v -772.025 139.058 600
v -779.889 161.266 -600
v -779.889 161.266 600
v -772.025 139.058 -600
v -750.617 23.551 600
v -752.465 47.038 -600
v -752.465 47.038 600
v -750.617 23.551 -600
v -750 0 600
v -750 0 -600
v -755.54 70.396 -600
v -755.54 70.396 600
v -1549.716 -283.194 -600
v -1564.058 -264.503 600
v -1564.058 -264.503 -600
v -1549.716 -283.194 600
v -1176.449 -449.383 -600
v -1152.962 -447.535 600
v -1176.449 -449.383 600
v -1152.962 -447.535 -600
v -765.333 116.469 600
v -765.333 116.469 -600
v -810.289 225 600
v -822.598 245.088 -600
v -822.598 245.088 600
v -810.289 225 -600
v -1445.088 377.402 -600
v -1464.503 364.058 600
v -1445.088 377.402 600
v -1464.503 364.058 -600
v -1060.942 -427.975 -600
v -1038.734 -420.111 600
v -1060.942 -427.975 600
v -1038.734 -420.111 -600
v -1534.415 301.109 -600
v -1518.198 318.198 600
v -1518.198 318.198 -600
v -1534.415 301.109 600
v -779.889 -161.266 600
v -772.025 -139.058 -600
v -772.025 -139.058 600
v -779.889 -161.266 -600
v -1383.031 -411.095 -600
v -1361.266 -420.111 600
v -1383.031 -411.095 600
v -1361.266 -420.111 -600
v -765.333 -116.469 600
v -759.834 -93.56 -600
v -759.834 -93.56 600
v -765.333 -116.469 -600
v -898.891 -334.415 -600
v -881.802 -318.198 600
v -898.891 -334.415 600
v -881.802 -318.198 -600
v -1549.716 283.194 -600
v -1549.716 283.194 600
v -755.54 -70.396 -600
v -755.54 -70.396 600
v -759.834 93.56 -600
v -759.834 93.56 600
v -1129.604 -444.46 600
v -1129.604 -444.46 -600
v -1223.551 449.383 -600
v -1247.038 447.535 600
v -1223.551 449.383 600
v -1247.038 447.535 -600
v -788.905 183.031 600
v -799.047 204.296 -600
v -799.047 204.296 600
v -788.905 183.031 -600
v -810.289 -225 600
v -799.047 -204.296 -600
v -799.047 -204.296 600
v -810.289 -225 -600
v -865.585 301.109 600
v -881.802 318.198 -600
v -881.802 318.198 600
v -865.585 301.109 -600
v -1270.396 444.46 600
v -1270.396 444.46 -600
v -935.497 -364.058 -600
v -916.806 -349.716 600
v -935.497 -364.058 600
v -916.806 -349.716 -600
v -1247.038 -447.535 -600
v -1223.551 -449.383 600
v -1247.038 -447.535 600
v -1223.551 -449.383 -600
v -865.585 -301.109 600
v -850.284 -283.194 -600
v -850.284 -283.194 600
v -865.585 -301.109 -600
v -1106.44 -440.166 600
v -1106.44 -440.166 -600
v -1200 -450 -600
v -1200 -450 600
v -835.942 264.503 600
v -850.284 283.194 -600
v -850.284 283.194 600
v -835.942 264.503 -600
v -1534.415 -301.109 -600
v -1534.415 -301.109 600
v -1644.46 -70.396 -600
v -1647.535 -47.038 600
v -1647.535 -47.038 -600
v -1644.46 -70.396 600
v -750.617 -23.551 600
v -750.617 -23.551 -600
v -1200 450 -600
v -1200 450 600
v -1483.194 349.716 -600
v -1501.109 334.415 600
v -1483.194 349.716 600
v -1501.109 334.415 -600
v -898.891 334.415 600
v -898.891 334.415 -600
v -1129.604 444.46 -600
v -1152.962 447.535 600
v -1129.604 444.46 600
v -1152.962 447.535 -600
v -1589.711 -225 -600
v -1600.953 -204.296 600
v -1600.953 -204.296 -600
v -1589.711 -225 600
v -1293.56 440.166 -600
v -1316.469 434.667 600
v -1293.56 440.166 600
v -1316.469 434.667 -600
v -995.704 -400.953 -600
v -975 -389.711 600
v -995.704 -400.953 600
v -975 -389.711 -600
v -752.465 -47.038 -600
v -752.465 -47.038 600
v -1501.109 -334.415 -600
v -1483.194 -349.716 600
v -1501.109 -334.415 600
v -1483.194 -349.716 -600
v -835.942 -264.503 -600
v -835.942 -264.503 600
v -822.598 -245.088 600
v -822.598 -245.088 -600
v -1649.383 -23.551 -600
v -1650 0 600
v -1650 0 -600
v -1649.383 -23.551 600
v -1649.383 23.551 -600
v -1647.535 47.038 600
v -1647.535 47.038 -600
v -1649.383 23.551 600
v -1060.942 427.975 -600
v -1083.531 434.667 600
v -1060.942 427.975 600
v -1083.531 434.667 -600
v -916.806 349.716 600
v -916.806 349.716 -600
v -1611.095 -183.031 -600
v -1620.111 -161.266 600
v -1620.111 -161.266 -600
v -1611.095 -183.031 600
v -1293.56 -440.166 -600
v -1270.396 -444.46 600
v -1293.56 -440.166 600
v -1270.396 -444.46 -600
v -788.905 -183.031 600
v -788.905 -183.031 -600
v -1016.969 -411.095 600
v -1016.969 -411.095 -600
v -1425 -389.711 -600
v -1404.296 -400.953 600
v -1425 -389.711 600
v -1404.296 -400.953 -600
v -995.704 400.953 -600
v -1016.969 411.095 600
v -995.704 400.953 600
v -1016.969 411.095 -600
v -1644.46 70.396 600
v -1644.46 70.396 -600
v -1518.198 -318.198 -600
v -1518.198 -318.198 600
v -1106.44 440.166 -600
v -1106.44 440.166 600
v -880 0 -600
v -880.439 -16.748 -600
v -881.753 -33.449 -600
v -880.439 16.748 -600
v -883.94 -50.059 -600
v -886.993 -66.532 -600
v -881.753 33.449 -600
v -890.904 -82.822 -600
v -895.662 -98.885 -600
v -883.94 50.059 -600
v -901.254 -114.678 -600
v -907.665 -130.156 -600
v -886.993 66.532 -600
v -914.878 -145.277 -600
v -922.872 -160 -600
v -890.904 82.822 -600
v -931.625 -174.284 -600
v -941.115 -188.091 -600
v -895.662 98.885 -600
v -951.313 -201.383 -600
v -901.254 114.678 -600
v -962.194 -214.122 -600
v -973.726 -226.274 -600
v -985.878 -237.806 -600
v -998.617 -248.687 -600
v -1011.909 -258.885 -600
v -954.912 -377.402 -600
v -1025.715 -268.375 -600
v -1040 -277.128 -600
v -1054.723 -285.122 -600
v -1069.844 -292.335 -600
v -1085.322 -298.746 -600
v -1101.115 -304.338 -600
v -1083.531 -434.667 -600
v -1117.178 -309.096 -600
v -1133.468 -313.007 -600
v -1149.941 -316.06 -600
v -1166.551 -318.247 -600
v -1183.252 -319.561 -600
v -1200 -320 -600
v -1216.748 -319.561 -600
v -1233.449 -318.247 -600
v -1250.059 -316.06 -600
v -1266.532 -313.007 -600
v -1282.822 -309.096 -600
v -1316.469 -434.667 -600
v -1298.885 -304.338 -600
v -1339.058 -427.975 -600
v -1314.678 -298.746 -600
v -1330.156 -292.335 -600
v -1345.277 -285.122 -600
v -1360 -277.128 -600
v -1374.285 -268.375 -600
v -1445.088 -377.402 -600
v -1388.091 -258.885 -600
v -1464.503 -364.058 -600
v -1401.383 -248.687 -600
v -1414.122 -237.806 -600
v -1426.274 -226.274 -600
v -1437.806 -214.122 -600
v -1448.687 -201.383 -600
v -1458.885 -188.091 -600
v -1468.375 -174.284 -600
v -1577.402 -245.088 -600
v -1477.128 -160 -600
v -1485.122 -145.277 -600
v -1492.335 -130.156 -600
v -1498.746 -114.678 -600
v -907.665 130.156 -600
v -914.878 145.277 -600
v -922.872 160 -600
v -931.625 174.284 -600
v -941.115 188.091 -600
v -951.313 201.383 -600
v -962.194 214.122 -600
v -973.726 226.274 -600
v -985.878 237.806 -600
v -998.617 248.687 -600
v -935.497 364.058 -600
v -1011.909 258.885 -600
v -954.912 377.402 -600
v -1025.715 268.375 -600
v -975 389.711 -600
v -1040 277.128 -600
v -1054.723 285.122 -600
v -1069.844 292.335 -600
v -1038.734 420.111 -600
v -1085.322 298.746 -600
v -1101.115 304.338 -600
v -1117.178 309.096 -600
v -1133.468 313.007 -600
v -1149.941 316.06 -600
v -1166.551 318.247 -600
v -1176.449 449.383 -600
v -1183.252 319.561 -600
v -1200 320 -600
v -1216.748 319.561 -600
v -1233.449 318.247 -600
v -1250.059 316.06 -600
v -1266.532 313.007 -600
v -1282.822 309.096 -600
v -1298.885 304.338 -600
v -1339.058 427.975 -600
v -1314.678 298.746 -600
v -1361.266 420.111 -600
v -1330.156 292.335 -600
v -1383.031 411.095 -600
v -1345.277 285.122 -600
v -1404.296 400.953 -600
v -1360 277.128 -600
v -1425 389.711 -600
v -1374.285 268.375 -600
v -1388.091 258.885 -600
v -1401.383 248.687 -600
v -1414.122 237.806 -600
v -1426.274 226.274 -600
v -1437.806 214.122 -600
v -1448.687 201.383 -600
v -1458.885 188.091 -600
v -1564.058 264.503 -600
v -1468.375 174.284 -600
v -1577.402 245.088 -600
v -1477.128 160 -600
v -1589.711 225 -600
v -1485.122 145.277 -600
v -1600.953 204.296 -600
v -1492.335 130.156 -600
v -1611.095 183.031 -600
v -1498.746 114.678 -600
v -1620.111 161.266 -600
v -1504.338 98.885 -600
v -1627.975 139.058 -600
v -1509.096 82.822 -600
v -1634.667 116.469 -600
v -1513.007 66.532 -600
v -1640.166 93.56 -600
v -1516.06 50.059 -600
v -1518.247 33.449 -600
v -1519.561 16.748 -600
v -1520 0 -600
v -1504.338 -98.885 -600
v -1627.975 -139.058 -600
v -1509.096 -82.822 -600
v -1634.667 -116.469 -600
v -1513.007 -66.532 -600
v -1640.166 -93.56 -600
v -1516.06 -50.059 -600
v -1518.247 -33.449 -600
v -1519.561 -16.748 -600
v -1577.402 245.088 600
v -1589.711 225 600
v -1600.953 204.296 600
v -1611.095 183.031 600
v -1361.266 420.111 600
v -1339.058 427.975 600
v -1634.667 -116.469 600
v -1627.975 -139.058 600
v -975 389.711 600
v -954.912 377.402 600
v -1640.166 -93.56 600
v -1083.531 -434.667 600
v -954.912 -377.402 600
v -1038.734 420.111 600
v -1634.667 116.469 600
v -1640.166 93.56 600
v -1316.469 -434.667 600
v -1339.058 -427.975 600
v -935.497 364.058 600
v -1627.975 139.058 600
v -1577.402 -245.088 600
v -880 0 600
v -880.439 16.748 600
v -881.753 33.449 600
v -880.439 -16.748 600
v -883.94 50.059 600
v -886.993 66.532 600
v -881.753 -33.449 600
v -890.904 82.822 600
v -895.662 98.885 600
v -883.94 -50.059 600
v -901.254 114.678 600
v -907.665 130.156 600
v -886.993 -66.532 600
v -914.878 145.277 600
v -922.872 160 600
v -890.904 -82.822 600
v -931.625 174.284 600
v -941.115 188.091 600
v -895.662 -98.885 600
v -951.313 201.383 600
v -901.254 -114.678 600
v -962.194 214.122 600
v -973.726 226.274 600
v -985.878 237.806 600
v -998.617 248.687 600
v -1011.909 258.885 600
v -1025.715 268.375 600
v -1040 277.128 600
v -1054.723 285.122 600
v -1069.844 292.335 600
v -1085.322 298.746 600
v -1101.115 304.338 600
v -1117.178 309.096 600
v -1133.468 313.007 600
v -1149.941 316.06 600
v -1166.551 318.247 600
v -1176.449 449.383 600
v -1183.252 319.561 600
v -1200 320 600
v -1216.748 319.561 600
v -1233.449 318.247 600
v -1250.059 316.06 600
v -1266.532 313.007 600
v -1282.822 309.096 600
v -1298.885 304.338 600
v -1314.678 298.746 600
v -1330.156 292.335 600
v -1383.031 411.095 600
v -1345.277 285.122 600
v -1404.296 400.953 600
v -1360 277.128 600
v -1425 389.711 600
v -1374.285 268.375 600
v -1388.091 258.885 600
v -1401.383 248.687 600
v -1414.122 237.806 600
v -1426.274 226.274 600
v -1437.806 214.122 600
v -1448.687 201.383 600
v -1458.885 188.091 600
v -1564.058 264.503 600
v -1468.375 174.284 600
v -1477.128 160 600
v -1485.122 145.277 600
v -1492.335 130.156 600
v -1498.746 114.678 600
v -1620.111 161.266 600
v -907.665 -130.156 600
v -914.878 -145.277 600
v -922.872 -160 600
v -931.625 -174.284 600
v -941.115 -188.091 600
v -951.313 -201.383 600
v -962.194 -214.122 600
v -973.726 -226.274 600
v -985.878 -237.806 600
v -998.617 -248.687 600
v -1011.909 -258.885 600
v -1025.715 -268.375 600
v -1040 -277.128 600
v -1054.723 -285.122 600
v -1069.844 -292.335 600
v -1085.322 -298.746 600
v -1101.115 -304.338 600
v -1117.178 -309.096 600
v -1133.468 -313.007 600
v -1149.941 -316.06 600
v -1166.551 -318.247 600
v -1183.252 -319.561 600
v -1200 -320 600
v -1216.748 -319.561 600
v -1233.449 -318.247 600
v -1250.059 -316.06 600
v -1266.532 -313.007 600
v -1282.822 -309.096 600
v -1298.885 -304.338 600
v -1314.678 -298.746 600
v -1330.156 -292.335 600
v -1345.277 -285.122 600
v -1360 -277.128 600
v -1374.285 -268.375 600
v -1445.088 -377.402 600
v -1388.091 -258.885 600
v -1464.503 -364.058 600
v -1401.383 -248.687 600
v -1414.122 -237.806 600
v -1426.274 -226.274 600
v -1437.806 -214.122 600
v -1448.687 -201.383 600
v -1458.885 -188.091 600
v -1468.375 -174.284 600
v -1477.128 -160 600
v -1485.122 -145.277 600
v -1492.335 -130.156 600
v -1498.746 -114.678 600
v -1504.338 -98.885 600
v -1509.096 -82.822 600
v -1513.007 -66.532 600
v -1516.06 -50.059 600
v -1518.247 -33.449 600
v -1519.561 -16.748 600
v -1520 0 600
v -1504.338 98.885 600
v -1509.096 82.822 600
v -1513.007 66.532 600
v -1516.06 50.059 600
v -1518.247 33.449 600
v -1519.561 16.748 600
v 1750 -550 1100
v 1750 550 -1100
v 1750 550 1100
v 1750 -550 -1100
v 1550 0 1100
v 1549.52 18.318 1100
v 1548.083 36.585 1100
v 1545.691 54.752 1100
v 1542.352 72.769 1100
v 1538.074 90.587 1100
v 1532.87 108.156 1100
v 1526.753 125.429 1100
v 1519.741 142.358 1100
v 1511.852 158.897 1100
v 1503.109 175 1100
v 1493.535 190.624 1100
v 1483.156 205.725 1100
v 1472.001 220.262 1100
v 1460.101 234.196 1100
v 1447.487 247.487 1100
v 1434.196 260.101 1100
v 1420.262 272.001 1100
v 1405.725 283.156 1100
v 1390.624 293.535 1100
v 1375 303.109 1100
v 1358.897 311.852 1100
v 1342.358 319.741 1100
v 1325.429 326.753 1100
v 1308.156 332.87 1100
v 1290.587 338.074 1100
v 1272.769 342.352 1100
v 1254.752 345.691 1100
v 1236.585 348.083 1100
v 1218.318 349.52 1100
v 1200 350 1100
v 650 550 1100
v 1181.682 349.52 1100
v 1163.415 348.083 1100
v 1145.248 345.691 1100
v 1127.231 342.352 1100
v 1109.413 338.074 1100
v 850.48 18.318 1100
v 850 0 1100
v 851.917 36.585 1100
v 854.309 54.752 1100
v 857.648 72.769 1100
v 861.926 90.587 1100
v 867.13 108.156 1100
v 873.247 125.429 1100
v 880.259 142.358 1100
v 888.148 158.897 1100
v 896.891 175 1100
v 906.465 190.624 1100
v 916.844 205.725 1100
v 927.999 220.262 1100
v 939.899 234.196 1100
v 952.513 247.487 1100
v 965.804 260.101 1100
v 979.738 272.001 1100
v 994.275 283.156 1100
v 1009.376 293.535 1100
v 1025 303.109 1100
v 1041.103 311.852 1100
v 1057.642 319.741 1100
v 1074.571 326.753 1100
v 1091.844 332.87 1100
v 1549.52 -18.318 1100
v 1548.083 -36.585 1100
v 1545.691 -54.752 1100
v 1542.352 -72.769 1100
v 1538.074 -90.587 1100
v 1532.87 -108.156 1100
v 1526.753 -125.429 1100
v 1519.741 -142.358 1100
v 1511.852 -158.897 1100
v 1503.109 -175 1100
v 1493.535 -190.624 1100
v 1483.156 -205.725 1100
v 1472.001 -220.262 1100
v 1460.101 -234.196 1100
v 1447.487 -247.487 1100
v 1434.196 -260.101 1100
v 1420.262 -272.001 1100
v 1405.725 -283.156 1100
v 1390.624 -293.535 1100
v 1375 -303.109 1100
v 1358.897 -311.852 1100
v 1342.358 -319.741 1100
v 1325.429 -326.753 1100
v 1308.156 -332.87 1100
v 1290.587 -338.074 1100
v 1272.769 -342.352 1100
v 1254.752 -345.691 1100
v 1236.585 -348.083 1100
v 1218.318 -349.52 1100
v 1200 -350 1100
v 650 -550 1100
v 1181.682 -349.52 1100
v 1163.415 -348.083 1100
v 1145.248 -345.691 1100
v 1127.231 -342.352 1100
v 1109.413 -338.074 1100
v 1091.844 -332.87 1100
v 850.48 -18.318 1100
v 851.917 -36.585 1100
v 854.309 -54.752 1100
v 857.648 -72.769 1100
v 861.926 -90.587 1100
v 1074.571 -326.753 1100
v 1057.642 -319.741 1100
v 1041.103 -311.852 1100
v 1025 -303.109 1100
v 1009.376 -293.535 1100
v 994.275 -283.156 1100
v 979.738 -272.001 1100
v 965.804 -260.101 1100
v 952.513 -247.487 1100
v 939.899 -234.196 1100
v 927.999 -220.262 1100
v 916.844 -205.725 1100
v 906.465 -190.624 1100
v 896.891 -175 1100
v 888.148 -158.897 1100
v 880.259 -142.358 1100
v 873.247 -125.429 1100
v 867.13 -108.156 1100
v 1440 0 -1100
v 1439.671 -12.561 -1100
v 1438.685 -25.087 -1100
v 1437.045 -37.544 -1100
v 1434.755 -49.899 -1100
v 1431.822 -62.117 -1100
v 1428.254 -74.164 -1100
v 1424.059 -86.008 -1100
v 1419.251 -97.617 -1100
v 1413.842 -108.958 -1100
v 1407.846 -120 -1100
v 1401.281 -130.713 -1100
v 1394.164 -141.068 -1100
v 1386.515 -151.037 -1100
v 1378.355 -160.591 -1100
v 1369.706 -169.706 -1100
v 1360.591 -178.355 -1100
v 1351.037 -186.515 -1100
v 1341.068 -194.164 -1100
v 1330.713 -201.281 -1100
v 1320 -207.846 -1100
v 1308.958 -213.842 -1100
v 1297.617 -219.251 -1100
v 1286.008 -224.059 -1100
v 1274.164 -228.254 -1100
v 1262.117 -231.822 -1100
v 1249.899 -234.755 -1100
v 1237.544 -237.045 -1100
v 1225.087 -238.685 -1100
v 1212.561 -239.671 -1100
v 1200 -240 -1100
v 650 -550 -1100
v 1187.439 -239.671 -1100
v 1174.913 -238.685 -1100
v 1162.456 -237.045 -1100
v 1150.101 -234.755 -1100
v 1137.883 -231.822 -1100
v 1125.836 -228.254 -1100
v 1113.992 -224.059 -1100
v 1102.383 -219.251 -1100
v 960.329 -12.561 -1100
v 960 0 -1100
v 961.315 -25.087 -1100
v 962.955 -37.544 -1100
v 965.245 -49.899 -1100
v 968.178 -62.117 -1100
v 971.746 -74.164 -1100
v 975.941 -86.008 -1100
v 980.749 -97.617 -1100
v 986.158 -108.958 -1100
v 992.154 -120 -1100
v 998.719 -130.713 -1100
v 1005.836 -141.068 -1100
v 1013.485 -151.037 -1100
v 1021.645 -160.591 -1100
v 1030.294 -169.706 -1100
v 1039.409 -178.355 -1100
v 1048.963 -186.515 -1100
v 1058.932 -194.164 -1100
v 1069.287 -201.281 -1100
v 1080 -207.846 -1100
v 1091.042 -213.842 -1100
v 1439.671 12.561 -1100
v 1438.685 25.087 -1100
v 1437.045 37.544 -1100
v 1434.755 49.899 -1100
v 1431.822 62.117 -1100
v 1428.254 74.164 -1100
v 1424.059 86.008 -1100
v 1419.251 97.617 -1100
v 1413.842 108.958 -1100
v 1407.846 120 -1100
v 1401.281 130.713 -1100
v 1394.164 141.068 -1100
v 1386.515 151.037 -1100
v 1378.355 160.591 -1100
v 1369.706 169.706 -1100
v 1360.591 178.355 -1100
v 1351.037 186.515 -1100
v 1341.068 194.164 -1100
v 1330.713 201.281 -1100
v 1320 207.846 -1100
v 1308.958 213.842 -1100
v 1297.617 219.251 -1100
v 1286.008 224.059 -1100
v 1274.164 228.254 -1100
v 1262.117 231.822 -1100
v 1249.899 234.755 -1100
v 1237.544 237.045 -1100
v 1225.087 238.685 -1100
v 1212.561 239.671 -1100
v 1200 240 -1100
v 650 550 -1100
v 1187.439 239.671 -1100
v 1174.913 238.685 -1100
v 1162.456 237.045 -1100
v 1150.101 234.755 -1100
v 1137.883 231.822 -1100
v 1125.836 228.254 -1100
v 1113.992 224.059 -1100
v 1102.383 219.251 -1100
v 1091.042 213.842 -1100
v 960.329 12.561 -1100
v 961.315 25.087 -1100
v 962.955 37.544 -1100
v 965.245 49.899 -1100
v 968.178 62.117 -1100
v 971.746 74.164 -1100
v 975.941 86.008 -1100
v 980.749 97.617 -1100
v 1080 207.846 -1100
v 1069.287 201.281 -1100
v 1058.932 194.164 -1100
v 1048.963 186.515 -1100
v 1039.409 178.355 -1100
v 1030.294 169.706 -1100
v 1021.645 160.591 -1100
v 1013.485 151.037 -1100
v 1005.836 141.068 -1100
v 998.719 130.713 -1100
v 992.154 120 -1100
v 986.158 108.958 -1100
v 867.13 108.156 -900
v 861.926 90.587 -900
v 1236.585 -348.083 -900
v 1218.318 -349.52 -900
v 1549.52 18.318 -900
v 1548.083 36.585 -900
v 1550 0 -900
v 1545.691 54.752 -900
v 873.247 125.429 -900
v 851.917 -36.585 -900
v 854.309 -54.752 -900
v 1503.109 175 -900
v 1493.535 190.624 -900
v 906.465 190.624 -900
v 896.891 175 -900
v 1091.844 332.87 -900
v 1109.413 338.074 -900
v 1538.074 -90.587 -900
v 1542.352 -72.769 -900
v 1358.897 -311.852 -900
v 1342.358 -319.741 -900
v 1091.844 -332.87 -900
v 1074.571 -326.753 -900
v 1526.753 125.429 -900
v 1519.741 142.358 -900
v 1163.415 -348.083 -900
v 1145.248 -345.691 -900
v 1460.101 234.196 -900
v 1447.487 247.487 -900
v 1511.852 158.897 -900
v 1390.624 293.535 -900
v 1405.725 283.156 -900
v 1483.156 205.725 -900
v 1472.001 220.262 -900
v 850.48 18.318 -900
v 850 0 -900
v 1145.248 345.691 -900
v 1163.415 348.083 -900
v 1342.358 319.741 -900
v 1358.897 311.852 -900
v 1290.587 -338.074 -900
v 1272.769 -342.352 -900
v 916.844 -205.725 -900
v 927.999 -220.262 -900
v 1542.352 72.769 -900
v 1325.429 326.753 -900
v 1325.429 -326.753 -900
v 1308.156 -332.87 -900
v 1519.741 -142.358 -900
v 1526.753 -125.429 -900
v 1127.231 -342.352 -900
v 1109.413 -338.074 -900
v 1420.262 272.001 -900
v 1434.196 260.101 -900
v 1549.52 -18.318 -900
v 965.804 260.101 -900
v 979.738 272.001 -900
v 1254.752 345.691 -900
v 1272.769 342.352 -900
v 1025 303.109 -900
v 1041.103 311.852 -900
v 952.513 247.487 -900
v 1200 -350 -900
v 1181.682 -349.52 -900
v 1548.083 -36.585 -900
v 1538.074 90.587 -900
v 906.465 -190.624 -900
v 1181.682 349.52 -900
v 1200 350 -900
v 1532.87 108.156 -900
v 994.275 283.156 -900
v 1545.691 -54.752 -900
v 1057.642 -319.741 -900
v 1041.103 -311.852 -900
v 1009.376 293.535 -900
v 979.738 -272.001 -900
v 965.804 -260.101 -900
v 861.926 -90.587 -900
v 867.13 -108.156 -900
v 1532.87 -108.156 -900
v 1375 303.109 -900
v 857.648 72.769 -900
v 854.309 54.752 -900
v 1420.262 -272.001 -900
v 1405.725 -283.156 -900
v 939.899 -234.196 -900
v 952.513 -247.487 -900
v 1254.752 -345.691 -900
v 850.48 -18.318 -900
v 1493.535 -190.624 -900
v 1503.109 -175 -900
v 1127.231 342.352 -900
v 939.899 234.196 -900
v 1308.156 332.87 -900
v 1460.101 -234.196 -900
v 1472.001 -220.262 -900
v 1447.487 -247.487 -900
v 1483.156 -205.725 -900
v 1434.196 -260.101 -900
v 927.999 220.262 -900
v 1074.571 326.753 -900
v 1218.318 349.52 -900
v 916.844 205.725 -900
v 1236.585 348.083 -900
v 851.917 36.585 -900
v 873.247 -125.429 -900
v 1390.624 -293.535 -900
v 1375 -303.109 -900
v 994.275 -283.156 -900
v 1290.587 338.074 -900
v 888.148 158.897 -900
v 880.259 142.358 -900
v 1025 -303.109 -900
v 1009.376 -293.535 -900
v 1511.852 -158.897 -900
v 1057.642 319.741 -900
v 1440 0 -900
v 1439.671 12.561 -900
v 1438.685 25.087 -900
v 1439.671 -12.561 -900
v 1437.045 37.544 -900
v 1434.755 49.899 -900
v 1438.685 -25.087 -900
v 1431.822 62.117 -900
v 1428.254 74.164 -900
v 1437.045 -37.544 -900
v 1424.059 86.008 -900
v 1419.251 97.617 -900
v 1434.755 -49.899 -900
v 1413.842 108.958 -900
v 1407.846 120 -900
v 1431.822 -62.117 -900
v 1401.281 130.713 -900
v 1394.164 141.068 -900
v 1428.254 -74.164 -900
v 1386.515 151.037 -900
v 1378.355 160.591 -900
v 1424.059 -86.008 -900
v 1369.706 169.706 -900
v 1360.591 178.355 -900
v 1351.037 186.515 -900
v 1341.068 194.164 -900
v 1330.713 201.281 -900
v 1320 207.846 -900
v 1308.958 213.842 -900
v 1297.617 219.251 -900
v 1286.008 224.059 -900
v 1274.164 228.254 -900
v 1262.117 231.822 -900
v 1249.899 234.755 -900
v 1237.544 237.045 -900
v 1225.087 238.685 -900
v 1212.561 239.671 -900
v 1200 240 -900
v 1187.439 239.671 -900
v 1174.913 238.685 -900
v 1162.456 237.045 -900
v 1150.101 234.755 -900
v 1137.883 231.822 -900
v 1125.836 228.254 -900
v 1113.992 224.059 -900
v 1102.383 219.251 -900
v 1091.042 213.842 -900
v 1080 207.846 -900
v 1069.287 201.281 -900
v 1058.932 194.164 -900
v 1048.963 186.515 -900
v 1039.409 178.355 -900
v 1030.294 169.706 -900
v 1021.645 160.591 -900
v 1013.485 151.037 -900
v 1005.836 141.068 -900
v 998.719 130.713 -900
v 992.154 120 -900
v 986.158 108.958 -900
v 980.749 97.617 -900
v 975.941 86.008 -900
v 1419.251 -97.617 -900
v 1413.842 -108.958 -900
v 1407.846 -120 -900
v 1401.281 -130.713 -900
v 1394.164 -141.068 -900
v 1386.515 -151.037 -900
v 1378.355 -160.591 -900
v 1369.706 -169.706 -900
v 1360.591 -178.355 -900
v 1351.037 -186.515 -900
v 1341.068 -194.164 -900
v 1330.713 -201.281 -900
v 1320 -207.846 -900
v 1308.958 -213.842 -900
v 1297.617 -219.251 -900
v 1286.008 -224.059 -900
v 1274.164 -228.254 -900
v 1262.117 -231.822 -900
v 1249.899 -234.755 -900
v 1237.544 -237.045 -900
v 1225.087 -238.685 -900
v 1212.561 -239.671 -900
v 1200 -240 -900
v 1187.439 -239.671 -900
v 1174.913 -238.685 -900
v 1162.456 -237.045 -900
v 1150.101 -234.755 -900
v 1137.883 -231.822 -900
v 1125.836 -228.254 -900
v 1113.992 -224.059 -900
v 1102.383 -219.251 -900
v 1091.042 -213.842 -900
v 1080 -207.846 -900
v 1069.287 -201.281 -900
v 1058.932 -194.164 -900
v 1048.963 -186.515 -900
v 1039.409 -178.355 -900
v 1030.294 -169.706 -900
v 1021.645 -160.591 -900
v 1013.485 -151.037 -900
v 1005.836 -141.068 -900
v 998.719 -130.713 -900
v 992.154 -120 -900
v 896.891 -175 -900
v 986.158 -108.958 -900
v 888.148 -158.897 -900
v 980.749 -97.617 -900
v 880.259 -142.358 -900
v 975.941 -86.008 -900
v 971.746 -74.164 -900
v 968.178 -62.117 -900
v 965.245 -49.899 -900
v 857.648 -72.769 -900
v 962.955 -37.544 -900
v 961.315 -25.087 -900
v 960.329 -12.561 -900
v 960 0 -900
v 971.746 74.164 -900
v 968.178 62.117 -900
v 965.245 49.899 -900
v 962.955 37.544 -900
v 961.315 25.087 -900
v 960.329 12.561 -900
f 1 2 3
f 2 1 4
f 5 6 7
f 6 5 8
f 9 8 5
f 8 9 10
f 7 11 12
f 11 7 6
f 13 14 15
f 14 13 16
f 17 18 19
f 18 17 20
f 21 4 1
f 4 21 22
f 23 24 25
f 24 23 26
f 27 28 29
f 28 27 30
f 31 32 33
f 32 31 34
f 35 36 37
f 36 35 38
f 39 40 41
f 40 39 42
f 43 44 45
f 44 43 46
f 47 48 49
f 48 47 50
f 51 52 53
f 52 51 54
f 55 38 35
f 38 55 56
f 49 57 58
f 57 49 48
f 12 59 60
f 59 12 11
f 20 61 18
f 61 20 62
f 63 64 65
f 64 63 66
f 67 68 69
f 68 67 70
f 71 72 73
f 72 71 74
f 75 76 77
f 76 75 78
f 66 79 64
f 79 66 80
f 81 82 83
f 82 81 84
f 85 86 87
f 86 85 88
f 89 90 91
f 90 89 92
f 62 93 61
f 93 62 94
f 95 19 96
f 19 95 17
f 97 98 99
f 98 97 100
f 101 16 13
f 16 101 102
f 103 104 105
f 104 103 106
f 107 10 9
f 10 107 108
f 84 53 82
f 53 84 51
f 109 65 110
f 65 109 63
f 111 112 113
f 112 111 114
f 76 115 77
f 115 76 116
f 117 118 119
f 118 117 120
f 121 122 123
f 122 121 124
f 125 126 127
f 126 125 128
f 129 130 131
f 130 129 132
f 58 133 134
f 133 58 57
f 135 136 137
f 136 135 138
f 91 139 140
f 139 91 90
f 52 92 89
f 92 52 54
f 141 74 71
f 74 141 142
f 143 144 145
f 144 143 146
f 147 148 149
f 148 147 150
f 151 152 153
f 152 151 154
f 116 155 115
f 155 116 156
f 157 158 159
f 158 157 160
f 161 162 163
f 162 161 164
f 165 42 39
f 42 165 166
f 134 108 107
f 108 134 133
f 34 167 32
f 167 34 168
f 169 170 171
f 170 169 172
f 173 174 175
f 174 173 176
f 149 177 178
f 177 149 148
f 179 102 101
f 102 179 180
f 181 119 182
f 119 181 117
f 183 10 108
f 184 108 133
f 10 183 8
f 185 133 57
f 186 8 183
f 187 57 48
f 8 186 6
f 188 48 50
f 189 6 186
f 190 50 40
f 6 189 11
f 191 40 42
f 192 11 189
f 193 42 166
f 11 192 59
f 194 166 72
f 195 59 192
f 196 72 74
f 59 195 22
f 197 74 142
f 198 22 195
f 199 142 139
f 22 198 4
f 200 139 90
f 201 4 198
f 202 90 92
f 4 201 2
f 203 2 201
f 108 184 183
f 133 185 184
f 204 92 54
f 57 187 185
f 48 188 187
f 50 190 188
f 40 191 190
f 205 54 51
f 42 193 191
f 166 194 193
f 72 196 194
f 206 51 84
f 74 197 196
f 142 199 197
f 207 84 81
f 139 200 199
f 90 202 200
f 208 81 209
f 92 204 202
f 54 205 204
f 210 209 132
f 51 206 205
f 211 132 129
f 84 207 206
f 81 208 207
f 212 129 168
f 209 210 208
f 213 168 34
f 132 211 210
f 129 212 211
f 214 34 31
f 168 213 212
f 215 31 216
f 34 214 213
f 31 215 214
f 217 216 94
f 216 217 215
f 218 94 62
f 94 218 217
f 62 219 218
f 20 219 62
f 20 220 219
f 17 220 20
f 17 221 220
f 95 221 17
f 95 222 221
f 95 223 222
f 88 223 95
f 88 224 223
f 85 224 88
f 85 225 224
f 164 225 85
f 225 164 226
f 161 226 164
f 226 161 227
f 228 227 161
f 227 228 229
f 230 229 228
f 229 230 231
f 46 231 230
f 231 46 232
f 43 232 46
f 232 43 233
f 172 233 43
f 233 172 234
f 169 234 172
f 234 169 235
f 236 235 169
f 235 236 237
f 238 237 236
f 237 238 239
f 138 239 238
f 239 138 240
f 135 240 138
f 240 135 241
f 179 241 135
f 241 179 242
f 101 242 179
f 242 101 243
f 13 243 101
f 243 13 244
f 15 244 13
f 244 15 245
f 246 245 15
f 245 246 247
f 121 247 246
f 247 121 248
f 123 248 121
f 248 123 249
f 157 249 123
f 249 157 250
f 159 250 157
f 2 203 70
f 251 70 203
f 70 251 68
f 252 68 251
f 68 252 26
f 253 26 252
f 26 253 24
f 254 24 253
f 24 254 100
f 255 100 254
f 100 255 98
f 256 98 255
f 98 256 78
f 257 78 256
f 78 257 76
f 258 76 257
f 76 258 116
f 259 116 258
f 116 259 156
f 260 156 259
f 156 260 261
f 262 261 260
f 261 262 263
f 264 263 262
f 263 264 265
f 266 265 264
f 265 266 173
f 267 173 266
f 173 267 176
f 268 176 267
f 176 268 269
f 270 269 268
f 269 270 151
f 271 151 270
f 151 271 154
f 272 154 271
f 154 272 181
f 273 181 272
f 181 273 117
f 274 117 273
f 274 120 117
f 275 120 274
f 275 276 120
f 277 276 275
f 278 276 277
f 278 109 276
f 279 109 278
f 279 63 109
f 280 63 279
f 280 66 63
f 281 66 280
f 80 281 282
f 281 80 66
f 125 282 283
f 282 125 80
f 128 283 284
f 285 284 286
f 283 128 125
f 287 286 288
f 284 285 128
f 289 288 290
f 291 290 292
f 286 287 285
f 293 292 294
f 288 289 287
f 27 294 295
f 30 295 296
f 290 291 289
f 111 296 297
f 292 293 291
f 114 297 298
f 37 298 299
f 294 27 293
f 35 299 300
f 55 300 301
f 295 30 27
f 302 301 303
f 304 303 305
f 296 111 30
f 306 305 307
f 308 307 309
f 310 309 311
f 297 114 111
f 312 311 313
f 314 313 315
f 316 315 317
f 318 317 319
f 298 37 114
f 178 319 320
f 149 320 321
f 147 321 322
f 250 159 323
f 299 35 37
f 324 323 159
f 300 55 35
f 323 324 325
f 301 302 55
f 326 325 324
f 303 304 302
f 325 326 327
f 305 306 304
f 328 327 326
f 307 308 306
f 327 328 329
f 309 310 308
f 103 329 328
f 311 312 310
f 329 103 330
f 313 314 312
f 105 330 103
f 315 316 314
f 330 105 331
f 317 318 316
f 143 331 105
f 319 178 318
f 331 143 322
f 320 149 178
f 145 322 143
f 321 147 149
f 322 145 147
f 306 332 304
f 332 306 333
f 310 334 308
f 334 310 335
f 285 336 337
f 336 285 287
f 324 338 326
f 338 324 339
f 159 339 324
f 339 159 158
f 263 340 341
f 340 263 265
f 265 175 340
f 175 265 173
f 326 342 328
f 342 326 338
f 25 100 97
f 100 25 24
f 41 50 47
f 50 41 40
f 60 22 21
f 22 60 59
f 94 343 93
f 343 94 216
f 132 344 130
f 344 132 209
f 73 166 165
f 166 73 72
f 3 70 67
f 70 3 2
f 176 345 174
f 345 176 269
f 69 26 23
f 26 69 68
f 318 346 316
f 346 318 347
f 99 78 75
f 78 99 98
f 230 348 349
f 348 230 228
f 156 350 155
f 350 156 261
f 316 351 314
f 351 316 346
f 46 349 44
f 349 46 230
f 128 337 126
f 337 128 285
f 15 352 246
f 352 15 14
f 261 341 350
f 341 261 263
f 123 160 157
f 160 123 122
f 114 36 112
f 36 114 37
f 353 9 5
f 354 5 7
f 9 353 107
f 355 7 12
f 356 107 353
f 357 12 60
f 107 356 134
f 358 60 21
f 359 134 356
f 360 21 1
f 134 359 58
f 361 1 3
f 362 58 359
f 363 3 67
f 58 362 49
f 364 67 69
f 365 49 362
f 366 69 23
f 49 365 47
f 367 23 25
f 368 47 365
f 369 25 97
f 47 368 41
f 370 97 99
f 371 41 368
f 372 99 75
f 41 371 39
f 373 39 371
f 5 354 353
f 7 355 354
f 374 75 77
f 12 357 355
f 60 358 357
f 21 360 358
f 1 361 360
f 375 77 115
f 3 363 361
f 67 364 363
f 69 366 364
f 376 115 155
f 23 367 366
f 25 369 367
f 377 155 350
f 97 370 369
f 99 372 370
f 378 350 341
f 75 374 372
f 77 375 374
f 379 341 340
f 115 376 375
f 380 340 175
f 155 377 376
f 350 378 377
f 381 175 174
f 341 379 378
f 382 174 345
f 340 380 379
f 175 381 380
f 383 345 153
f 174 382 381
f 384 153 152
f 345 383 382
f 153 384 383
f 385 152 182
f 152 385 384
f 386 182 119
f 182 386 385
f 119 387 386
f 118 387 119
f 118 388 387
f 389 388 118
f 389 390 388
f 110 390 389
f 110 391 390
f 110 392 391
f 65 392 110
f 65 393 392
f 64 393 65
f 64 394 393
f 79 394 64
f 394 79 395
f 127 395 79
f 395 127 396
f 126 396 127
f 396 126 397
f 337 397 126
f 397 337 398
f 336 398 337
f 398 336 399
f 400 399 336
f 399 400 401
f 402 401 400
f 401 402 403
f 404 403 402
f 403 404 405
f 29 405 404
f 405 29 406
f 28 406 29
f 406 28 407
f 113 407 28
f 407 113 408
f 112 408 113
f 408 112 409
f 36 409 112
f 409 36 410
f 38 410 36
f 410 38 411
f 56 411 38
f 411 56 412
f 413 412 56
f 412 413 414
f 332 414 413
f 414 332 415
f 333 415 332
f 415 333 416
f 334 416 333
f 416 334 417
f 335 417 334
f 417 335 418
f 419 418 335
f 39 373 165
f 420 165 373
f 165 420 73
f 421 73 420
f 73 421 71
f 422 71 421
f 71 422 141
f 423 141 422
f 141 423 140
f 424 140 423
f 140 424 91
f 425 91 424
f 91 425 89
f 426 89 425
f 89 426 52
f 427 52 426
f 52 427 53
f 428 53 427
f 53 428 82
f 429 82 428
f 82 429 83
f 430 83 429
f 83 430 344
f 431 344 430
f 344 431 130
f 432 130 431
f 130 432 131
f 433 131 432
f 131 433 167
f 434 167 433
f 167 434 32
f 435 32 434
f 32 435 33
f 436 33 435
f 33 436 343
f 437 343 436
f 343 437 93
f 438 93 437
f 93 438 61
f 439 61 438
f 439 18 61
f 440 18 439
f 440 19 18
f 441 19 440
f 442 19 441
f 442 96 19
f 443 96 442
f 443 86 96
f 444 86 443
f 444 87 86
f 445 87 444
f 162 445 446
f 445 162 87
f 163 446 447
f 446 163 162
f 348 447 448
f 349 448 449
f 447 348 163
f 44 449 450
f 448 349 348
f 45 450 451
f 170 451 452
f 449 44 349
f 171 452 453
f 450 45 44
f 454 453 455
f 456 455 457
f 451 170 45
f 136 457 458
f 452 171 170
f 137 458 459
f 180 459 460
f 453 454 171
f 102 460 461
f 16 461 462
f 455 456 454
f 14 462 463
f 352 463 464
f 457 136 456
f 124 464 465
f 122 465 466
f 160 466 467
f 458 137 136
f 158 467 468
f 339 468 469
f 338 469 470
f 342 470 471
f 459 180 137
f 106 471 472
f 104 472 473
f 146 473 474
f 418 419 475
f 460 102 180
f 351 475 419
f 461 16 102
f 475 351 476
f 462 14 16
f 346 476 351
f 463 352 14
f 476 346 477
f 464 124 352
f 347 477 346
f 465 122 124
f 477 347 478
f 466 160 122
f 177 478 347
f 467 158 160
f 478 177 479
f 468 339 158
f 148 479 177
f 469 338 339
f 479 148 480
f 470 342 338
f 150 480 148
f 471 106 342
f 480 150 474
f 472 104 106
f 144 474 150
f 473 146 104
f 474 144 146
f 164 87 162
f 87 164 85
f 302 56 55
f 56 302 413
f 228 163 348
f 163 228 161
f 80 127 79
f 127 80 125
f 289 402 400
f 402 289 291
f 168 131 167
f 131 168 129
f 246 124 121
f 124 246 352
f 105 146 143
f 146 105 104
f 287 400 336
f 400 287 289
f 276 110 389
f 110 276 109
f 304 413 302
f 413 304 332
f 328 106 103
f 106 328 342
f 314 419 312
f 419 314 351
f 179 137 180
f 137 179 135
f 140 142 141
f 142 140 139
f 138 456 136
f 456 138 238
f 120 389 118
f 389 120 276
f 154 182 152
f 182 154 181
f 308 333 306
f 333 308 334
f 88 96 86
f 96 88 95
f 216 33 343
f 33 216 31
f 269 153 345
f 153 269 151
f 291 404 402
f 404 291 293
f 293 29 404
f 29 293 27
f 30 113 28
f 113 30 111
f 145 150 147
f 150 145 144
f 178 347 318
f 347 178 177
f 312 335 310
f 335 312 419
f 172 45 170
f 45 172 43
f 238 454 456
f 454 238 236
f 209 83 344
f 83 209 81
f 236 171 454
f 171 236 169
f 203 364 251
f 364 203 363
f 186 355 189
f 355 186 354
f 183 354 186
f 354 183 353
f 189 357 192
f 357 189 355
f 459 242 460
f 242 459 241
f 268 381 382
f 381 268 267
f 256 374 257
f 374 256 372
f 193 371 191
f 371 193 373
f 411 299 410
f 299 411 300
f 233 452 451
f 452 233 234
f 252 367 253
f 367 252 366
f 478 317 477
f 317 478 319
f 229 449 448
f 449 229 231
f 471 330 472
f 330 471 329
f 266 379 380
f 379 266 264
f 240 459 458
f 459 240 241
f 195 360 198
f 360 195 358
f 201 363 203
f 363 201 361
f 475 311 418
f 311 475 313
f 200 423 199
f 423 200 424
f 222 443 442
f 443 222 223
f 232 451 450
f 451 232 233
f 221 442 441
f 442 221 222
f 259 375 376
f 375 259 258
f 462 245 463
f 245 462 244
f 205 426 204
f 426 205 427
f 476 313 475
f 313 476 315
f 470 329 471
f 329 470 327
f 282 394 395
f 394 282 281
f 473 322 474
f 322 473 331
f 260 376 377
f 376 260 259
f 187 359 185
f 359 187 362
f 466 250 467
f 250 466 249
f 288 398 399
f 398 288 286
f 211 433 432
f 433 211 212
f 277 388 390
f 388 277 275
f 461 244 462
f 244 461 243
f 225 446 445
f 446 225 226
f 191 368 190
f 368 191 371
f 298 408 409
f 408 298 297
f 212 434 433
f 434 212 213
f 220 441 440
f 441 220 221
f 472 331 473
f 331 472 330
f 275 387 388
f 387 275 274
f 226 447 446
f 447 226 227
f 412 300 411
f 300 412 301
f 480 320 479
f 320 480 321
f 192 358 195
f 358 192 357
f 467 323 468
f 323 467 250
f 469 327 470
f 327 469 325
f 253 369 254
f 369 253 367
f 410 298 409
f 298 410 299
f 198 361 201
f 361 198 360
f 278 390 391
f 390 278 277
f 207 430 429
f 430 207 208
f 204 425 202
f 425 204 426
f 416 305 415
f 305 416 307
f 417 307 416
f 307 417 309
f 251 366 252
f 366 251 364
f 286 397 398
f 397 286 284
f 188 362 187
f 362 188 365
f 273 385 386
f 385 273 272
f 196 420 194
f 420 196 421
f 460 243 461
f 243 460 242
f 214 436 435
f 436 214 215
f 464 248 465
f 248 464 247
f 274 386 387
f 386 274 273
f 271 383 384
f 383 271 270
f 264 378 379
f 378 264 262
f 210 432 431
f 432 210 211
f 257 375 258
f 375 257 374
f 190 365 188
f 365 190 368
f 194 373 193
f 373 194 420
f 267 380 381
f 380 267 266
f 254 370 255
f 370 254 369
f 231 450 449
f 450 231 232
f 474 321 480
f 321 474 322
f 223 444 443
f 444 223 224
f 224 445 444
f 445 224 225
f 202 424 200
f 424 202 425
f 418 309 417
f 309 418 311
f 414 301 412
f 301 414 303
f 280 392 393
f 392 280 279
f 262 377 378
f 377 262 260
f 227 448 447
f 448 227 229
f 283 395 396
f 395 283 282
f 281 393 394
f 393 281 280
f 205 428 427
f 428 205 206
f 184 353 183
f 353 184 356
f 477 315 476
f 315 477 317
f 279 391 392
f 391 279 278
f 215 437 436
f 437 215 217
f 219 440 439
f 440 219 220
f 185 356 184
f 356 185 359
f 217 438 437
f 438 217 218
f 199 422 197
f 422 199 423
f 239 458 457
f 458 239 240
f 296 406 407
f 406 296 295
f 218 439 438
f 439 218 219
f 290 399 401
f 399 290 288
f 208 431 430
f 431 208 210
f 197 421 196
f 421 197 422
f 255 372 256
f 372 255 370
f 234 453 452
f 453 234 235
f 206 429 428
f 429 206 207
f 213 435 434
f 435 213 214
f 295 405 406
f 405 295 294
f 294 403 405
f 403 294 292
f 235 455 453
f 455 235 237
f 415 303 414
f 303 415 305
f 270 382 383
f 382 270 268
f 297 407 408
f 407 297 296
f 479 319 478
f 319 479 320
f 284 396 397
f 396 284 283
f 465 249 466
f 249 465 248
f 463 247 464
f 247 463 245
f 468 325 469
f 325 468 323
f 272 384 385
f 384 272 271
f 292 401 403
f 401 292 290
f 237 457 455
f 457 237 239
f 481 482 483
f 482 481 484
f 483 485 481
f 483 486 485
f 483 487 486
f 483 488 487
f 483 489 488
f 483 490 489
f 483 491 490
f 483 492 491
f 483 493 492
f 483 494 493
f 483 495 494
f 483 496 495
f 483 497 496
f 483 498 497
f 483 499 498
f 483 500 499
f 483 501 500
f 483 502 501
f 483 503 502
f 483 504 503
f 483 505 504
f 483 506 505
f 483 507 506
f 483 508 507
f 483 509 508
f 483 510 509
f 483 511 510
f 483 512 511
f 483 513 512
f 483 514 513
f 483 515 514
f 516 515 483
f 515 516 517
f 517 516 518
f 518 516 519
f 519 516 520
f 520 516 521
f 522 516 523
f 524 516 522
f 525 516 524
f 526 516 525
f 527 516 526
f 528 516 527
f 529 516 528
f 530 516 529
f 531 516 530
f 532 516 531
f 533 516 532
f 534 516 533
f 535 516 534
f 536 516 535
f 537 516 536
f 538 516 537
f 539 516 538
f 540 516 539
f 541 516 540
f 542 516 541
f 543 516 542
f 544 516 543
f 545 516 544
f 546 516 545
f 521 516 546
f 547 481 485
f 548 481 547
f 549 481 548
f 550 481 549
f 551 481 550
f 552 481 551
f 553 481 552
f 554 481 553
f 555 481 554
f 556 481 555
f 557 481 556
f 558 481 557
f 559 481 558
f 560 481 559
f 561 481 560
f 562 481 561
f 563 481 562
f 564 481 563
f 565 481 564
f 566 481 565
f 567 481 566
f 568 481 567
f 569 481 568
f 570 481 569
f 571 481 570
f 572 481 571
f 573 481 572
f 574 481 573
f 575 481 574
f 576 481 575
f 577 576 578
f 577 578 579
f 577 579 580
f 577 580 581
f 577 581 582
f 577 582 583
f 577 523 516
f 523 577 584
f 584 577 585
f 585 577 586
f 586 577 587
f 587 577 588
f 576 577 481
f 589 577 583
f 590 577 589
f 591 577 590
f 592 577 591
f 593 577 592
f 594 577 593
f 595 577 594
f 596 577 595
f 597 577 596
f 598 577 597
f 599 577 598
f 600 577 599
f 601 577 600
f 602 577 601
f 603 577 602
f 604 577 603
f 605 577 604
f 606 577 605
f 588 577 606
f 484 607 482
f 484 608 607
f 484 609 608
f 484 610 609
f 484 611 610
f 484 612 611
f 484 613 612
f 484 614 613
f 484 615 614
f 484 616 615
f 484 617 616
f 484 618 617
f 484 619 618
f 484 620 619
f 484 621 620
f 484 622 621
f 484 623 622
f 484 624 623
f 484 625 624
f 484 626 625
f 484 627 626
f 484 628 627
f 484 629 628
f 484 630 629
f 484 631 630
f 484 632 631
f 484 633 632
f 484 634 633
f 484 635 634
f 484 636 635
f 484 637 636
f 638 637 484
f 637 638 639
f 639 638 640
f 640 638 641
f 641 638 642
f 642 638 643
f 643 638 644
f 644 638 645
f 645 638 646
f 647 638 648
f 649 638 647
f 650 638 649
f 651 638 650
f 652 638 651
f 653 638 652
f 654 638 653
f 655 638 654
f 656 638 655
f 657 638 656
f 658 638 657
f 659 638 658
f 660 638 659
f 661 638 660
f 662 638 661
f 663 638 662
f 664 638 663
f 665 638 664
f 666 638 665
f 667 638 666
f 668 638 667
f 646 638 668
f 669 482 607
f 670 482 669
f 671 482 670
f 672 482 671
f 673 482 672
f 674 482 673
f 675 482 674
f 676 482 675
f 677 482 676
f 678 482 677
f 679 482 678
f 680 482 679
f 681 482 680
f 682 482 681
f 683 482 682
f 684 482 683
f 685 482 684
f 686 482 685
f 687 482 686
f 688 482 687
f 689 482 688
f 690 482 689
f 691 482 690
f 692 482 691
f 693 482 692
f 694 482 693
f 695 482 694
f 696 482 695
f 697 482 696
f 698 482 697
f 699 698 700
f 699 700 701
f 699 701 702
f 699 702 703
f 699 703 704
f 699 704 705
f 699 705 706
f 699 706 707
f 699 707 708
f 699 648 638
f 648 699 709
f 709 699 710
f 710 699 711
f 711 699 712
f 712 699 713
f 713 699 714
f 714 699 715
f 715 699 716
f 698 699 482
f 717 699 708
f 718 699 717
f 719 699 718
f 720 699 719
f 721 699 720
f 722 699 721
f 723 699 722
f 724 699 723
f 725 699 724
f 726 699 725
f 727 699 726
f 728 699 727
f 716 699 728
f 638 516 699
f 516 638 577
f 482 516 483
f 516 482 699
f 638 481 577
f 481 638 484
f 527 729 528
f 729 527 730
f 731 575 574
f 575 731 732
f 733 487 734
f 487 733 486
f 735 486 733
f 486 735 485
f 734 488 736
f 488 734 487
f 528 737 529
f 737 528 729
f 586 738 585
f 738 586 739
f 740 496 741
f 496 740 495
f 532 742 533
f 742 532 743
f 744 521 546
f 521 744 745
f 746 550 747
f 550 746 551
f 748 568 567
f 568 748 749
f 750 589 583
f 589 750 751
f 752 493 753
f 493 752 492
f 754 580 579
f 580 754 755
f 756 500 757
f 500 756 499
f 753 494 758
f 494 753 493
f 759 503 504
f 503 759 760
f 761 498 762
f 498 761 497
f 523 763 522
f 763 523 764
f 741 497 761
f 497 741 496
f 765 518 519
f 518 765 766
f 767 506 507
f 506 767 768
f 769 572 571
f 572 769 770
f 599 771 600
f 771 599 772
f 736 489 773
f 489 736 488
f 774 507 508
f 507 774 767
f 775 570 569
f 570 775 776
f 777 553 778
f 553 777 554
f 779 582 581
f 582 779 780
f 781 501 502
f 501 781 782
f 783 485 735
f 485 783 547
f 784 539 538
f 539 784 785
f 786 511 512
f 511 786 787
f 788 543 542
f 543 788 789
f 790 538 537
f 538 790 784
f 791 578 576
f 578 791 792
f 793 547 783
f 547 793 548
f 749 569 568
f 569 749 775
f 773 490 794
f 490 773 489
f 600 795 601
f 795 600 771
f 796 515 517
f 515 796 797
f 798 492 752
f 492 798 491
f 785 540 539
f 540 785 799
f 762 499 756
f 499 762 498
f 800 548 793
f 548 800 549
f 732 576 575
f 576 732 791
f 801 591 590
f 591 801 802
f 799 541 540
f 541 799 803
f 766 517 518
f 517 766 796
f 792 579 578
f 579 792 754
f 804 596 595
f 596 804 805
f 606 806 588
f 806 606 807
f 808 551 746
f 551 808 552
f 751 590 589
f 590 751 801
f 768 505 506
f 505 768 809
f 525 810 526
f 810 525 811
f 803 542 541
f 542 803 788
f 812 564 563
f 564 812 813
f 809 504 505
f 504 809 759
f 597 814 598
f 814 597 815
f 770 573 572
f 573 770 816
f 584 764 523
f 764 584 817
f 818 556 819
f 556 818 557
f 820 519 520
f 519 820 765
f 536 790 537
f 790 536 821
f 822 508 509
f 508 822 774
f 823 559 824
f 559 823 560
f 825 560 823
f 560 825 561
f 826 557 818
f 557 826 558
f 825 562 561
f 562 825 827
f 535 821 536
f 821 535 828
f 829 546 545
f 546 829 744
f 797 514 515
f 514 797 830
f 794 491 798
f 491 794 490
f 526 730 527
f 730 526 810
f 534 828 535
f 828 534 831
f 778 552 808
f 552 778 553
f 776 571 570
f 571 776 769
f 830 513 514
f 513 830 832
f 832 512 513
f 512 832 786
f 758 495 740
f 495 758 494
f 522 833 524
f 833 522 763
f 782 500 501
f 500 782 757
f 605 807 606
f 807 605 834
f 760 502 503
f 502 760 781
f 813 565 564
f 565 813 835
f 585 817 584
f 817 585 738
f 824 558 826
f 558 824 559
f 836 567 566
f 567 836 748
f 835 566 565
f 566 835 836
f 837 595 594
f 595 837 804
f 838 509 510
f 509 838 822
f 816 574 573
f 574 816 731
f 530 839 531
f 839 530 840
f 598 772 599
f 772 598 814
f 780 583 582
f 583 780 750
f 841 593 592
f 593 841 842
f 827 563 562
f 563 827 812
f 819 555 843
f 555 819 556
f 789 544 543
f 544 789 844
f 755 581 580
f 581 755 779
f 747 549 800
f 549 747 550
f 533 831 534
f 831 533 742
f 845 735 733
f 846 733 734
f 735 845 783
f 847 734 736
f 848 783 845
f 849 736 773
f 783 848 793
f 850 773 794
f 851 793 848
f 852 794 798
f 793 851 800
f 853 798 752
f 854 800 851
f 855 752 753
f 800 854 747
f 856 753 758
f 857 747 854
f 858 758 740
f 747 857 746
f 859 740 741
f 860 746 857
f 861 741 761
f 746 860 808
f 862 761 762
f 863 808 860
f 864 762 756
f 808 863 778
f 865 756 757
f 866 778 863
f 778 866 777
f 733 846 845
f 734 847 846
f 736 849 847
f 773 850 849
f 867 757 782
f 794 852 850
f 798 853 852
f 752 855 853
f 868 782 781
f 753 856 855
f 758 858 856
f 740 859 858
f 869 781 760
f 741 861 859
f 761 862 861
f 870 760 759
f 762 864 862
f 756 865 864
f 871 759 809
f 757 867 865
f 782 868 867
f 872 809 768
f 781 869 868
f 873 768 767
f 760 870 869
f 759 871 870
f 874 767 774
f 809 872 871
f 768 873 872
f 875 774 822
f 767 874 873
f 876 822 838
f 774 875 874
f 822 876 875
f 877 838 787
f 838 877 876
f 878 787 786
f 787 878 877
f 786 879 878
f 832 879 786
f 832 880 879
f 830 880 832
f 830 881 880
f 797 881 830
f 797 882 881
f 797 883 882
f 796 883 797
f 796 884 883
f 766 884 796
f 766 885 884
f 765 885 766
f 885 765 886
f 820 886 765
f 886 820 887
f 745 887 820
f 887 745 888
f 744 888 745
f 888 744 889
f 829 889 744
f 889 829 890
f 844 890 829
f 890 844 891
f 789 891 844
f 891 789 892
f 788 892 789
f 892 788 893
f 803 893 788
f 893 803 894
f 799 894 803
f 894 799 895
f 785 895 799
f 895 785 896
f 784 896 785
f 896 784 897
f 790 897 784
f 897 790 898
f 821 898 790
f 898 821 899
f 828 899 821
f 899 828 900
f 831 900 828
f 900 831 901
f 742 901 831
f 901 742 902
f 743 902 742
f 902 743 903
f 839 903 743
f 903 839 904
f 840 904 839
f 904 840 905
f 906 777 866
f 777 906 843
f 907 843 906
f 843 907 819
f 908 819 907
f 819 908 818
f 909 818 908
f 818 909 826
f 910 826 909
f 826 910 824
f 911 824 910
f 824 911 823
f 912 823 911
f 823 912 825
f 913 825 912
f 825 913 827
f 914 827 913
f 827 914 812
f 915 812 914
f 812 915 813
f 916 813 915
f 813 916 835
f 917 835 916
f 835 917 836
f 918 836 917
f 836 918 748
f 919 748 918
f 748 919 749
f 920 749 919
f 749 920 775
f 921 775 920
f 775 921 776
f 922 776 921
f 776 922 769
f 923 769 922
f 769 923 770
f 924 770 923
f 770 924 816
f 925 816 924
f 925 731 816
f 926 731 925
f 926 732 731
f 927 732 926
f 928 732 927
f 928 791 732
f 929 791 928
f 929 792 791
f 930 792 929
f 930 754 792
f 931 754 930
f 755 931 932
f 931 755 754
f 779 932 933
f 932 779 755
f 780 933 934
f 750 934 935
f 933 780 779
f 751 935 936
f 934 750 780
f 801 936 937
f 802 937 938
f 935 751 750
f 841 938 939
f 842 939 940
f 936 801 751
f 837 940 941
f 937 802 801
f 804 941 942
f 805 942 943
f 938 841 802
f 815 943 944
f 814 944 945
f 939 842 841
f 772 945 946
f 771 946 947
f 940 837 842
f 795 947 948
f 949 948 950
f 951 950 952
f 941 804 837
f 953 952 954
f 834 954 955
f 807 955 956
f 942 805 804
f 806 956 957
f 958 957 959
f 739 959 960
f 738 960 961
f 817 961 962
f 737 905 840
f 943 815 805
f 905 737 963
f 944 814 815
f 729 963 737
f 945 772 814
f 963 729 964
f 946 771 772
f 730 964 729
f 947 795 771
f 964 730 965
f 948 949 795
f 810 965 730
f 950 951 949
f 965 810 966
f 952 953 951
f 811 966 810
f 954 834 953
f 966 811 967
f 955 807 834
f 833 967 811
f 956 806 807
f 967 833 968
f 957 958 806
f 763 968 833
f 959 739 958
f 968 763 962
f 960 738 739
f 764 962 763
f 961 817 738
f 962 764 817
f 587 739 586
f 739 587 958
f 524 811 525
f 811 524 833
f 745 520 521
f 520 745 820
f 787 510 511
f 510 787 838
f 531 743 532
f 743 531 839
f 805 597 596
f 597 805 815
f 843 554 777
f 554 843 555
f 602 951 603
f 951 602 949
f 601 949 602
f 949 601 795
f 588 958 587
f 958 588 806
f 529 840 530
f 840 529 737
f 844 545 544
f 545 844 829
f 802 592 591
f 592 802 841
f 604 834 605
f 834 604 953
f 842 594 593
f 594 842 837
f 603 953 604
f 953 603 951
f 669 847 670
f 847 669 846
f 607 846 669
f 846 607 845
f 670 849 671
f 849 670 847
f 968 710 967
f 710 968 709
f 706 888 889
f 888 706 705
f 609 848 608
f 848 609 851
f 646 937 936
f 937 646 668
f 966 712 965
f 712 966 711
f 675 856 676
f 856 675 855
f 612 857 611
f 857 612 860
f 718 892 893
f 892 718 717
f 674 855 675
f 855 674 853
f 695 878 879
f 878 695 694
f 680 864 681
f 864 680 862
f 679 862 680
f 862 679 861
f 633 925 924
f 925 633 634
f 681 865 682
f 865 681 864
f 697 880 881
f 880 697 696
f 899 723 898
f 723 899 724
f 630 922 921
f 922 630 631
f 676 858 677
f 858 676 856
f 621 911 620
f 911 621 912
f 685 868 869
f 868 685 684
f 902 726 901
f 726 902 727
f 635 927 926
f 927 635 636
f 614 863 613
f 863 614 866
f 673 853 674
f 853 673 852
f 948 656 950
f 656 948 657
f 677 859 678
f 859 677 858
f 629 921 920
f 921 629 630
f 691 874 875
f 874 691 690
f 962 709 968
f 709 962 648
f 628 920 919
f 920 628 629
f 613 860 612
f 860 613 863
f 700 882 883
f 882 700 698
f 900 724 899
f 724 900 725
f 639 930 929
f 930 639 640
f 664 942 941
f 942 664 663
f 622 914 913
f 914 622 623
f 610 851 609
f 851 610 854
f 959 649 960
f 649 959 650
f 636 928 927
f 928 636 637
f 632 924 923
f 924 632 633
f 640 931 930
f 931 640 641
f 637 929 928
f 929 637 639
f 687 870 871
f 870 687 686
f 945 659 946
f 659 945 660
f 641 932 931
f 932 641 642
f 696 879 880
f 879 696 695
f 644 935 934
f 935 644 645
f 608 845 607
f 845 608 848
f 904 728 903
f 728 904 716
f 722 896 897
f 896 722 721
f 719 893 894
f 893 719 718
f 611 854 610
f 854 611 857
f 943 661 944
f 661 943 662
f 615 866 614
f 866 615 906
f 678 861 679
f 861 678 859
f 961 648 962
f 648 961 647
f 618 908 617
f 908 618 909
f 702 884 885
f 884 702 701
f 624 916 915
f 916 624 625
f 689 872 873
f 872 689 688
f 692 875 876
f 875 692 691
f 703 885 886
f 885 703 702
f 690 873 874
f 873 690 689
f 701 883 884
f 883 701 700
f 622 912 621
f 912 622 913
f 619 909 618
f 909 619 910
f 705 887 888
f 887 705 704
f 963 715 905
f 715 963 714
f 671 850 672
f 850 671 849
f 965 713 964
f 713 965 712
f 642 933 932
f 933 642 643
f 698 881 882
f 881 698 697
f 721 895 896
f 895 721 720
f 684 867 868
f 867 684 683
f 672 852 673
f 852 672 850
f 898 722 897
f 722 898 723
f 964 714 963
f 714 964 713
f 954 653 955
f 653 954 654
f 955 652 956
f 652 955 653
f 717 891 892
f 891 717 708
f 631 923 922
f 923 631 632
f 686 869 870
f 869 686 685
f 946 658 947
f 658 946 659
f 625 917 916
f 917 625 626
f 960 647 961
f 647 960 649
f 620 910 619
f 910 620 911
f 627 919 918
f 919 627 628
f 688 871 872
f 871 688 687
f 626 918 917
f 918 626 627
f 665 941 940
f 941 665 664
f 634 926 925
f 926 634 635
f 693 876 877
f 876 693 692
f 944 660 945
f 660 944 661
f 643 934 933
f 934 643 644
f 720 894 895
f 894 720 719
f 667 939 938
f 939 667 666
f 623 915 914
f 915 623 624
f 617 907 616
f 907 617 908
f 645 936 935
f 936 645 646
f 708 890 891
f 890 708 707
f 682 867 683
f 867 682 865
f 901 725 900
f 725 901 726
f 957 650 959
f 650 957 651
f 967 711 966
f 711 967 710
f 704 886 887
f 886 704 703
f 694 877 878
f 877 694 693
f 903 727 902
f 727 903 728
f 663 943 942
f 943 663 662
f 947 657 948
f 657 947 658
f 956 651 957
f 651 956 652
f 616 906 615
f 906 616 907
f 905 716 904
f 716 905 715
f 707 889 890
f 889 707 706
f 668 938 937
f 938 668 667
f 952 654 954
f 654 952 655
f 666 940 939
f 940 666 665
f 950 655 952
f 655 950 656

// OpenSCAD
// =========================================================================
// SPECIFICATION FILE: mechanical_blueprints.scad
// DESCRIPTION: Propeller Shaft MHD Sleeves & Keel Hydraulic Actuator Pockets
// =========================================================================

$fn = 120; // High-fidelity geometric rendering resolution

// --- Core Propulsion Parameters ---
shaft_diameter       = 610.0;   // Historical Iowa-class shaft core thickness (mm)
gallium_sleeve_gap   = 15.0;    // Fluid dynamic clearance for liquid metal layer (mm)
mhd_housing_outer_r  = 450.0;   // Outer electromagnetic coil radius (mm)

// --- Core Actuator Parameters ---
piston_rod_diameter  = 450.0;   // Solid Titanium (Ti-6Al-4V) core (mm)
cylinder_bore_r      = 350.0;   // 700mm structural bore radius (mm)
pocket_depth         = 2200.0;  // Keel embedding depth allowance (mm)

module MHD_Propeller_Shaft_Sleeve(d_shaft=shaft_diameter, gap=gallium_sleeve_gap, r_ext=mhd_housing_outer_r) {
    difference() {
        // Outer Electromagnetic Coil Structural Housing
        cylinder(h=1200, r=r_ext, center=true);
        // Liquid Gallium Conductive Layer Cavity Void
        cylinder(h=1202, r=(d_shaft/2) + gap, center=true);
        // Interior Shaft Passage Tolerance Path
        cylinder(h=1204, r=d_shaft/2, center=true);
    }
}

module Keel_Hydraulic_Actuator_Pocket(r_bore=cylinder_bore_r, d_rod=piston_rod_diameter, depth=pocket_depth) {
    difference() {
        // Heavy Cast Steel Keel Mounting Block Block
        cube([1100, 1100, depth], center=true);
        // Internal Forged Steel Cylinder Casing Cavity
        translate([0, 0, 100])
            cylinder(h=depth - 200, r=r_bore, center=true);
        // Lower Clearance Passage for the Titanium Actuator Rod
        translate([0, 0, -500])
            cylinder(h=depth, r=(d_rod/2) + 15, center=true);
    }
}

// Renders compilation assembly for architectural validation
translate([-1200, 0, 0]) MHD_Propeller_Shaft_Sleeve();
translate([1200, 0, 0])  Keel_Hydraulic_Actuator_Pocket();
